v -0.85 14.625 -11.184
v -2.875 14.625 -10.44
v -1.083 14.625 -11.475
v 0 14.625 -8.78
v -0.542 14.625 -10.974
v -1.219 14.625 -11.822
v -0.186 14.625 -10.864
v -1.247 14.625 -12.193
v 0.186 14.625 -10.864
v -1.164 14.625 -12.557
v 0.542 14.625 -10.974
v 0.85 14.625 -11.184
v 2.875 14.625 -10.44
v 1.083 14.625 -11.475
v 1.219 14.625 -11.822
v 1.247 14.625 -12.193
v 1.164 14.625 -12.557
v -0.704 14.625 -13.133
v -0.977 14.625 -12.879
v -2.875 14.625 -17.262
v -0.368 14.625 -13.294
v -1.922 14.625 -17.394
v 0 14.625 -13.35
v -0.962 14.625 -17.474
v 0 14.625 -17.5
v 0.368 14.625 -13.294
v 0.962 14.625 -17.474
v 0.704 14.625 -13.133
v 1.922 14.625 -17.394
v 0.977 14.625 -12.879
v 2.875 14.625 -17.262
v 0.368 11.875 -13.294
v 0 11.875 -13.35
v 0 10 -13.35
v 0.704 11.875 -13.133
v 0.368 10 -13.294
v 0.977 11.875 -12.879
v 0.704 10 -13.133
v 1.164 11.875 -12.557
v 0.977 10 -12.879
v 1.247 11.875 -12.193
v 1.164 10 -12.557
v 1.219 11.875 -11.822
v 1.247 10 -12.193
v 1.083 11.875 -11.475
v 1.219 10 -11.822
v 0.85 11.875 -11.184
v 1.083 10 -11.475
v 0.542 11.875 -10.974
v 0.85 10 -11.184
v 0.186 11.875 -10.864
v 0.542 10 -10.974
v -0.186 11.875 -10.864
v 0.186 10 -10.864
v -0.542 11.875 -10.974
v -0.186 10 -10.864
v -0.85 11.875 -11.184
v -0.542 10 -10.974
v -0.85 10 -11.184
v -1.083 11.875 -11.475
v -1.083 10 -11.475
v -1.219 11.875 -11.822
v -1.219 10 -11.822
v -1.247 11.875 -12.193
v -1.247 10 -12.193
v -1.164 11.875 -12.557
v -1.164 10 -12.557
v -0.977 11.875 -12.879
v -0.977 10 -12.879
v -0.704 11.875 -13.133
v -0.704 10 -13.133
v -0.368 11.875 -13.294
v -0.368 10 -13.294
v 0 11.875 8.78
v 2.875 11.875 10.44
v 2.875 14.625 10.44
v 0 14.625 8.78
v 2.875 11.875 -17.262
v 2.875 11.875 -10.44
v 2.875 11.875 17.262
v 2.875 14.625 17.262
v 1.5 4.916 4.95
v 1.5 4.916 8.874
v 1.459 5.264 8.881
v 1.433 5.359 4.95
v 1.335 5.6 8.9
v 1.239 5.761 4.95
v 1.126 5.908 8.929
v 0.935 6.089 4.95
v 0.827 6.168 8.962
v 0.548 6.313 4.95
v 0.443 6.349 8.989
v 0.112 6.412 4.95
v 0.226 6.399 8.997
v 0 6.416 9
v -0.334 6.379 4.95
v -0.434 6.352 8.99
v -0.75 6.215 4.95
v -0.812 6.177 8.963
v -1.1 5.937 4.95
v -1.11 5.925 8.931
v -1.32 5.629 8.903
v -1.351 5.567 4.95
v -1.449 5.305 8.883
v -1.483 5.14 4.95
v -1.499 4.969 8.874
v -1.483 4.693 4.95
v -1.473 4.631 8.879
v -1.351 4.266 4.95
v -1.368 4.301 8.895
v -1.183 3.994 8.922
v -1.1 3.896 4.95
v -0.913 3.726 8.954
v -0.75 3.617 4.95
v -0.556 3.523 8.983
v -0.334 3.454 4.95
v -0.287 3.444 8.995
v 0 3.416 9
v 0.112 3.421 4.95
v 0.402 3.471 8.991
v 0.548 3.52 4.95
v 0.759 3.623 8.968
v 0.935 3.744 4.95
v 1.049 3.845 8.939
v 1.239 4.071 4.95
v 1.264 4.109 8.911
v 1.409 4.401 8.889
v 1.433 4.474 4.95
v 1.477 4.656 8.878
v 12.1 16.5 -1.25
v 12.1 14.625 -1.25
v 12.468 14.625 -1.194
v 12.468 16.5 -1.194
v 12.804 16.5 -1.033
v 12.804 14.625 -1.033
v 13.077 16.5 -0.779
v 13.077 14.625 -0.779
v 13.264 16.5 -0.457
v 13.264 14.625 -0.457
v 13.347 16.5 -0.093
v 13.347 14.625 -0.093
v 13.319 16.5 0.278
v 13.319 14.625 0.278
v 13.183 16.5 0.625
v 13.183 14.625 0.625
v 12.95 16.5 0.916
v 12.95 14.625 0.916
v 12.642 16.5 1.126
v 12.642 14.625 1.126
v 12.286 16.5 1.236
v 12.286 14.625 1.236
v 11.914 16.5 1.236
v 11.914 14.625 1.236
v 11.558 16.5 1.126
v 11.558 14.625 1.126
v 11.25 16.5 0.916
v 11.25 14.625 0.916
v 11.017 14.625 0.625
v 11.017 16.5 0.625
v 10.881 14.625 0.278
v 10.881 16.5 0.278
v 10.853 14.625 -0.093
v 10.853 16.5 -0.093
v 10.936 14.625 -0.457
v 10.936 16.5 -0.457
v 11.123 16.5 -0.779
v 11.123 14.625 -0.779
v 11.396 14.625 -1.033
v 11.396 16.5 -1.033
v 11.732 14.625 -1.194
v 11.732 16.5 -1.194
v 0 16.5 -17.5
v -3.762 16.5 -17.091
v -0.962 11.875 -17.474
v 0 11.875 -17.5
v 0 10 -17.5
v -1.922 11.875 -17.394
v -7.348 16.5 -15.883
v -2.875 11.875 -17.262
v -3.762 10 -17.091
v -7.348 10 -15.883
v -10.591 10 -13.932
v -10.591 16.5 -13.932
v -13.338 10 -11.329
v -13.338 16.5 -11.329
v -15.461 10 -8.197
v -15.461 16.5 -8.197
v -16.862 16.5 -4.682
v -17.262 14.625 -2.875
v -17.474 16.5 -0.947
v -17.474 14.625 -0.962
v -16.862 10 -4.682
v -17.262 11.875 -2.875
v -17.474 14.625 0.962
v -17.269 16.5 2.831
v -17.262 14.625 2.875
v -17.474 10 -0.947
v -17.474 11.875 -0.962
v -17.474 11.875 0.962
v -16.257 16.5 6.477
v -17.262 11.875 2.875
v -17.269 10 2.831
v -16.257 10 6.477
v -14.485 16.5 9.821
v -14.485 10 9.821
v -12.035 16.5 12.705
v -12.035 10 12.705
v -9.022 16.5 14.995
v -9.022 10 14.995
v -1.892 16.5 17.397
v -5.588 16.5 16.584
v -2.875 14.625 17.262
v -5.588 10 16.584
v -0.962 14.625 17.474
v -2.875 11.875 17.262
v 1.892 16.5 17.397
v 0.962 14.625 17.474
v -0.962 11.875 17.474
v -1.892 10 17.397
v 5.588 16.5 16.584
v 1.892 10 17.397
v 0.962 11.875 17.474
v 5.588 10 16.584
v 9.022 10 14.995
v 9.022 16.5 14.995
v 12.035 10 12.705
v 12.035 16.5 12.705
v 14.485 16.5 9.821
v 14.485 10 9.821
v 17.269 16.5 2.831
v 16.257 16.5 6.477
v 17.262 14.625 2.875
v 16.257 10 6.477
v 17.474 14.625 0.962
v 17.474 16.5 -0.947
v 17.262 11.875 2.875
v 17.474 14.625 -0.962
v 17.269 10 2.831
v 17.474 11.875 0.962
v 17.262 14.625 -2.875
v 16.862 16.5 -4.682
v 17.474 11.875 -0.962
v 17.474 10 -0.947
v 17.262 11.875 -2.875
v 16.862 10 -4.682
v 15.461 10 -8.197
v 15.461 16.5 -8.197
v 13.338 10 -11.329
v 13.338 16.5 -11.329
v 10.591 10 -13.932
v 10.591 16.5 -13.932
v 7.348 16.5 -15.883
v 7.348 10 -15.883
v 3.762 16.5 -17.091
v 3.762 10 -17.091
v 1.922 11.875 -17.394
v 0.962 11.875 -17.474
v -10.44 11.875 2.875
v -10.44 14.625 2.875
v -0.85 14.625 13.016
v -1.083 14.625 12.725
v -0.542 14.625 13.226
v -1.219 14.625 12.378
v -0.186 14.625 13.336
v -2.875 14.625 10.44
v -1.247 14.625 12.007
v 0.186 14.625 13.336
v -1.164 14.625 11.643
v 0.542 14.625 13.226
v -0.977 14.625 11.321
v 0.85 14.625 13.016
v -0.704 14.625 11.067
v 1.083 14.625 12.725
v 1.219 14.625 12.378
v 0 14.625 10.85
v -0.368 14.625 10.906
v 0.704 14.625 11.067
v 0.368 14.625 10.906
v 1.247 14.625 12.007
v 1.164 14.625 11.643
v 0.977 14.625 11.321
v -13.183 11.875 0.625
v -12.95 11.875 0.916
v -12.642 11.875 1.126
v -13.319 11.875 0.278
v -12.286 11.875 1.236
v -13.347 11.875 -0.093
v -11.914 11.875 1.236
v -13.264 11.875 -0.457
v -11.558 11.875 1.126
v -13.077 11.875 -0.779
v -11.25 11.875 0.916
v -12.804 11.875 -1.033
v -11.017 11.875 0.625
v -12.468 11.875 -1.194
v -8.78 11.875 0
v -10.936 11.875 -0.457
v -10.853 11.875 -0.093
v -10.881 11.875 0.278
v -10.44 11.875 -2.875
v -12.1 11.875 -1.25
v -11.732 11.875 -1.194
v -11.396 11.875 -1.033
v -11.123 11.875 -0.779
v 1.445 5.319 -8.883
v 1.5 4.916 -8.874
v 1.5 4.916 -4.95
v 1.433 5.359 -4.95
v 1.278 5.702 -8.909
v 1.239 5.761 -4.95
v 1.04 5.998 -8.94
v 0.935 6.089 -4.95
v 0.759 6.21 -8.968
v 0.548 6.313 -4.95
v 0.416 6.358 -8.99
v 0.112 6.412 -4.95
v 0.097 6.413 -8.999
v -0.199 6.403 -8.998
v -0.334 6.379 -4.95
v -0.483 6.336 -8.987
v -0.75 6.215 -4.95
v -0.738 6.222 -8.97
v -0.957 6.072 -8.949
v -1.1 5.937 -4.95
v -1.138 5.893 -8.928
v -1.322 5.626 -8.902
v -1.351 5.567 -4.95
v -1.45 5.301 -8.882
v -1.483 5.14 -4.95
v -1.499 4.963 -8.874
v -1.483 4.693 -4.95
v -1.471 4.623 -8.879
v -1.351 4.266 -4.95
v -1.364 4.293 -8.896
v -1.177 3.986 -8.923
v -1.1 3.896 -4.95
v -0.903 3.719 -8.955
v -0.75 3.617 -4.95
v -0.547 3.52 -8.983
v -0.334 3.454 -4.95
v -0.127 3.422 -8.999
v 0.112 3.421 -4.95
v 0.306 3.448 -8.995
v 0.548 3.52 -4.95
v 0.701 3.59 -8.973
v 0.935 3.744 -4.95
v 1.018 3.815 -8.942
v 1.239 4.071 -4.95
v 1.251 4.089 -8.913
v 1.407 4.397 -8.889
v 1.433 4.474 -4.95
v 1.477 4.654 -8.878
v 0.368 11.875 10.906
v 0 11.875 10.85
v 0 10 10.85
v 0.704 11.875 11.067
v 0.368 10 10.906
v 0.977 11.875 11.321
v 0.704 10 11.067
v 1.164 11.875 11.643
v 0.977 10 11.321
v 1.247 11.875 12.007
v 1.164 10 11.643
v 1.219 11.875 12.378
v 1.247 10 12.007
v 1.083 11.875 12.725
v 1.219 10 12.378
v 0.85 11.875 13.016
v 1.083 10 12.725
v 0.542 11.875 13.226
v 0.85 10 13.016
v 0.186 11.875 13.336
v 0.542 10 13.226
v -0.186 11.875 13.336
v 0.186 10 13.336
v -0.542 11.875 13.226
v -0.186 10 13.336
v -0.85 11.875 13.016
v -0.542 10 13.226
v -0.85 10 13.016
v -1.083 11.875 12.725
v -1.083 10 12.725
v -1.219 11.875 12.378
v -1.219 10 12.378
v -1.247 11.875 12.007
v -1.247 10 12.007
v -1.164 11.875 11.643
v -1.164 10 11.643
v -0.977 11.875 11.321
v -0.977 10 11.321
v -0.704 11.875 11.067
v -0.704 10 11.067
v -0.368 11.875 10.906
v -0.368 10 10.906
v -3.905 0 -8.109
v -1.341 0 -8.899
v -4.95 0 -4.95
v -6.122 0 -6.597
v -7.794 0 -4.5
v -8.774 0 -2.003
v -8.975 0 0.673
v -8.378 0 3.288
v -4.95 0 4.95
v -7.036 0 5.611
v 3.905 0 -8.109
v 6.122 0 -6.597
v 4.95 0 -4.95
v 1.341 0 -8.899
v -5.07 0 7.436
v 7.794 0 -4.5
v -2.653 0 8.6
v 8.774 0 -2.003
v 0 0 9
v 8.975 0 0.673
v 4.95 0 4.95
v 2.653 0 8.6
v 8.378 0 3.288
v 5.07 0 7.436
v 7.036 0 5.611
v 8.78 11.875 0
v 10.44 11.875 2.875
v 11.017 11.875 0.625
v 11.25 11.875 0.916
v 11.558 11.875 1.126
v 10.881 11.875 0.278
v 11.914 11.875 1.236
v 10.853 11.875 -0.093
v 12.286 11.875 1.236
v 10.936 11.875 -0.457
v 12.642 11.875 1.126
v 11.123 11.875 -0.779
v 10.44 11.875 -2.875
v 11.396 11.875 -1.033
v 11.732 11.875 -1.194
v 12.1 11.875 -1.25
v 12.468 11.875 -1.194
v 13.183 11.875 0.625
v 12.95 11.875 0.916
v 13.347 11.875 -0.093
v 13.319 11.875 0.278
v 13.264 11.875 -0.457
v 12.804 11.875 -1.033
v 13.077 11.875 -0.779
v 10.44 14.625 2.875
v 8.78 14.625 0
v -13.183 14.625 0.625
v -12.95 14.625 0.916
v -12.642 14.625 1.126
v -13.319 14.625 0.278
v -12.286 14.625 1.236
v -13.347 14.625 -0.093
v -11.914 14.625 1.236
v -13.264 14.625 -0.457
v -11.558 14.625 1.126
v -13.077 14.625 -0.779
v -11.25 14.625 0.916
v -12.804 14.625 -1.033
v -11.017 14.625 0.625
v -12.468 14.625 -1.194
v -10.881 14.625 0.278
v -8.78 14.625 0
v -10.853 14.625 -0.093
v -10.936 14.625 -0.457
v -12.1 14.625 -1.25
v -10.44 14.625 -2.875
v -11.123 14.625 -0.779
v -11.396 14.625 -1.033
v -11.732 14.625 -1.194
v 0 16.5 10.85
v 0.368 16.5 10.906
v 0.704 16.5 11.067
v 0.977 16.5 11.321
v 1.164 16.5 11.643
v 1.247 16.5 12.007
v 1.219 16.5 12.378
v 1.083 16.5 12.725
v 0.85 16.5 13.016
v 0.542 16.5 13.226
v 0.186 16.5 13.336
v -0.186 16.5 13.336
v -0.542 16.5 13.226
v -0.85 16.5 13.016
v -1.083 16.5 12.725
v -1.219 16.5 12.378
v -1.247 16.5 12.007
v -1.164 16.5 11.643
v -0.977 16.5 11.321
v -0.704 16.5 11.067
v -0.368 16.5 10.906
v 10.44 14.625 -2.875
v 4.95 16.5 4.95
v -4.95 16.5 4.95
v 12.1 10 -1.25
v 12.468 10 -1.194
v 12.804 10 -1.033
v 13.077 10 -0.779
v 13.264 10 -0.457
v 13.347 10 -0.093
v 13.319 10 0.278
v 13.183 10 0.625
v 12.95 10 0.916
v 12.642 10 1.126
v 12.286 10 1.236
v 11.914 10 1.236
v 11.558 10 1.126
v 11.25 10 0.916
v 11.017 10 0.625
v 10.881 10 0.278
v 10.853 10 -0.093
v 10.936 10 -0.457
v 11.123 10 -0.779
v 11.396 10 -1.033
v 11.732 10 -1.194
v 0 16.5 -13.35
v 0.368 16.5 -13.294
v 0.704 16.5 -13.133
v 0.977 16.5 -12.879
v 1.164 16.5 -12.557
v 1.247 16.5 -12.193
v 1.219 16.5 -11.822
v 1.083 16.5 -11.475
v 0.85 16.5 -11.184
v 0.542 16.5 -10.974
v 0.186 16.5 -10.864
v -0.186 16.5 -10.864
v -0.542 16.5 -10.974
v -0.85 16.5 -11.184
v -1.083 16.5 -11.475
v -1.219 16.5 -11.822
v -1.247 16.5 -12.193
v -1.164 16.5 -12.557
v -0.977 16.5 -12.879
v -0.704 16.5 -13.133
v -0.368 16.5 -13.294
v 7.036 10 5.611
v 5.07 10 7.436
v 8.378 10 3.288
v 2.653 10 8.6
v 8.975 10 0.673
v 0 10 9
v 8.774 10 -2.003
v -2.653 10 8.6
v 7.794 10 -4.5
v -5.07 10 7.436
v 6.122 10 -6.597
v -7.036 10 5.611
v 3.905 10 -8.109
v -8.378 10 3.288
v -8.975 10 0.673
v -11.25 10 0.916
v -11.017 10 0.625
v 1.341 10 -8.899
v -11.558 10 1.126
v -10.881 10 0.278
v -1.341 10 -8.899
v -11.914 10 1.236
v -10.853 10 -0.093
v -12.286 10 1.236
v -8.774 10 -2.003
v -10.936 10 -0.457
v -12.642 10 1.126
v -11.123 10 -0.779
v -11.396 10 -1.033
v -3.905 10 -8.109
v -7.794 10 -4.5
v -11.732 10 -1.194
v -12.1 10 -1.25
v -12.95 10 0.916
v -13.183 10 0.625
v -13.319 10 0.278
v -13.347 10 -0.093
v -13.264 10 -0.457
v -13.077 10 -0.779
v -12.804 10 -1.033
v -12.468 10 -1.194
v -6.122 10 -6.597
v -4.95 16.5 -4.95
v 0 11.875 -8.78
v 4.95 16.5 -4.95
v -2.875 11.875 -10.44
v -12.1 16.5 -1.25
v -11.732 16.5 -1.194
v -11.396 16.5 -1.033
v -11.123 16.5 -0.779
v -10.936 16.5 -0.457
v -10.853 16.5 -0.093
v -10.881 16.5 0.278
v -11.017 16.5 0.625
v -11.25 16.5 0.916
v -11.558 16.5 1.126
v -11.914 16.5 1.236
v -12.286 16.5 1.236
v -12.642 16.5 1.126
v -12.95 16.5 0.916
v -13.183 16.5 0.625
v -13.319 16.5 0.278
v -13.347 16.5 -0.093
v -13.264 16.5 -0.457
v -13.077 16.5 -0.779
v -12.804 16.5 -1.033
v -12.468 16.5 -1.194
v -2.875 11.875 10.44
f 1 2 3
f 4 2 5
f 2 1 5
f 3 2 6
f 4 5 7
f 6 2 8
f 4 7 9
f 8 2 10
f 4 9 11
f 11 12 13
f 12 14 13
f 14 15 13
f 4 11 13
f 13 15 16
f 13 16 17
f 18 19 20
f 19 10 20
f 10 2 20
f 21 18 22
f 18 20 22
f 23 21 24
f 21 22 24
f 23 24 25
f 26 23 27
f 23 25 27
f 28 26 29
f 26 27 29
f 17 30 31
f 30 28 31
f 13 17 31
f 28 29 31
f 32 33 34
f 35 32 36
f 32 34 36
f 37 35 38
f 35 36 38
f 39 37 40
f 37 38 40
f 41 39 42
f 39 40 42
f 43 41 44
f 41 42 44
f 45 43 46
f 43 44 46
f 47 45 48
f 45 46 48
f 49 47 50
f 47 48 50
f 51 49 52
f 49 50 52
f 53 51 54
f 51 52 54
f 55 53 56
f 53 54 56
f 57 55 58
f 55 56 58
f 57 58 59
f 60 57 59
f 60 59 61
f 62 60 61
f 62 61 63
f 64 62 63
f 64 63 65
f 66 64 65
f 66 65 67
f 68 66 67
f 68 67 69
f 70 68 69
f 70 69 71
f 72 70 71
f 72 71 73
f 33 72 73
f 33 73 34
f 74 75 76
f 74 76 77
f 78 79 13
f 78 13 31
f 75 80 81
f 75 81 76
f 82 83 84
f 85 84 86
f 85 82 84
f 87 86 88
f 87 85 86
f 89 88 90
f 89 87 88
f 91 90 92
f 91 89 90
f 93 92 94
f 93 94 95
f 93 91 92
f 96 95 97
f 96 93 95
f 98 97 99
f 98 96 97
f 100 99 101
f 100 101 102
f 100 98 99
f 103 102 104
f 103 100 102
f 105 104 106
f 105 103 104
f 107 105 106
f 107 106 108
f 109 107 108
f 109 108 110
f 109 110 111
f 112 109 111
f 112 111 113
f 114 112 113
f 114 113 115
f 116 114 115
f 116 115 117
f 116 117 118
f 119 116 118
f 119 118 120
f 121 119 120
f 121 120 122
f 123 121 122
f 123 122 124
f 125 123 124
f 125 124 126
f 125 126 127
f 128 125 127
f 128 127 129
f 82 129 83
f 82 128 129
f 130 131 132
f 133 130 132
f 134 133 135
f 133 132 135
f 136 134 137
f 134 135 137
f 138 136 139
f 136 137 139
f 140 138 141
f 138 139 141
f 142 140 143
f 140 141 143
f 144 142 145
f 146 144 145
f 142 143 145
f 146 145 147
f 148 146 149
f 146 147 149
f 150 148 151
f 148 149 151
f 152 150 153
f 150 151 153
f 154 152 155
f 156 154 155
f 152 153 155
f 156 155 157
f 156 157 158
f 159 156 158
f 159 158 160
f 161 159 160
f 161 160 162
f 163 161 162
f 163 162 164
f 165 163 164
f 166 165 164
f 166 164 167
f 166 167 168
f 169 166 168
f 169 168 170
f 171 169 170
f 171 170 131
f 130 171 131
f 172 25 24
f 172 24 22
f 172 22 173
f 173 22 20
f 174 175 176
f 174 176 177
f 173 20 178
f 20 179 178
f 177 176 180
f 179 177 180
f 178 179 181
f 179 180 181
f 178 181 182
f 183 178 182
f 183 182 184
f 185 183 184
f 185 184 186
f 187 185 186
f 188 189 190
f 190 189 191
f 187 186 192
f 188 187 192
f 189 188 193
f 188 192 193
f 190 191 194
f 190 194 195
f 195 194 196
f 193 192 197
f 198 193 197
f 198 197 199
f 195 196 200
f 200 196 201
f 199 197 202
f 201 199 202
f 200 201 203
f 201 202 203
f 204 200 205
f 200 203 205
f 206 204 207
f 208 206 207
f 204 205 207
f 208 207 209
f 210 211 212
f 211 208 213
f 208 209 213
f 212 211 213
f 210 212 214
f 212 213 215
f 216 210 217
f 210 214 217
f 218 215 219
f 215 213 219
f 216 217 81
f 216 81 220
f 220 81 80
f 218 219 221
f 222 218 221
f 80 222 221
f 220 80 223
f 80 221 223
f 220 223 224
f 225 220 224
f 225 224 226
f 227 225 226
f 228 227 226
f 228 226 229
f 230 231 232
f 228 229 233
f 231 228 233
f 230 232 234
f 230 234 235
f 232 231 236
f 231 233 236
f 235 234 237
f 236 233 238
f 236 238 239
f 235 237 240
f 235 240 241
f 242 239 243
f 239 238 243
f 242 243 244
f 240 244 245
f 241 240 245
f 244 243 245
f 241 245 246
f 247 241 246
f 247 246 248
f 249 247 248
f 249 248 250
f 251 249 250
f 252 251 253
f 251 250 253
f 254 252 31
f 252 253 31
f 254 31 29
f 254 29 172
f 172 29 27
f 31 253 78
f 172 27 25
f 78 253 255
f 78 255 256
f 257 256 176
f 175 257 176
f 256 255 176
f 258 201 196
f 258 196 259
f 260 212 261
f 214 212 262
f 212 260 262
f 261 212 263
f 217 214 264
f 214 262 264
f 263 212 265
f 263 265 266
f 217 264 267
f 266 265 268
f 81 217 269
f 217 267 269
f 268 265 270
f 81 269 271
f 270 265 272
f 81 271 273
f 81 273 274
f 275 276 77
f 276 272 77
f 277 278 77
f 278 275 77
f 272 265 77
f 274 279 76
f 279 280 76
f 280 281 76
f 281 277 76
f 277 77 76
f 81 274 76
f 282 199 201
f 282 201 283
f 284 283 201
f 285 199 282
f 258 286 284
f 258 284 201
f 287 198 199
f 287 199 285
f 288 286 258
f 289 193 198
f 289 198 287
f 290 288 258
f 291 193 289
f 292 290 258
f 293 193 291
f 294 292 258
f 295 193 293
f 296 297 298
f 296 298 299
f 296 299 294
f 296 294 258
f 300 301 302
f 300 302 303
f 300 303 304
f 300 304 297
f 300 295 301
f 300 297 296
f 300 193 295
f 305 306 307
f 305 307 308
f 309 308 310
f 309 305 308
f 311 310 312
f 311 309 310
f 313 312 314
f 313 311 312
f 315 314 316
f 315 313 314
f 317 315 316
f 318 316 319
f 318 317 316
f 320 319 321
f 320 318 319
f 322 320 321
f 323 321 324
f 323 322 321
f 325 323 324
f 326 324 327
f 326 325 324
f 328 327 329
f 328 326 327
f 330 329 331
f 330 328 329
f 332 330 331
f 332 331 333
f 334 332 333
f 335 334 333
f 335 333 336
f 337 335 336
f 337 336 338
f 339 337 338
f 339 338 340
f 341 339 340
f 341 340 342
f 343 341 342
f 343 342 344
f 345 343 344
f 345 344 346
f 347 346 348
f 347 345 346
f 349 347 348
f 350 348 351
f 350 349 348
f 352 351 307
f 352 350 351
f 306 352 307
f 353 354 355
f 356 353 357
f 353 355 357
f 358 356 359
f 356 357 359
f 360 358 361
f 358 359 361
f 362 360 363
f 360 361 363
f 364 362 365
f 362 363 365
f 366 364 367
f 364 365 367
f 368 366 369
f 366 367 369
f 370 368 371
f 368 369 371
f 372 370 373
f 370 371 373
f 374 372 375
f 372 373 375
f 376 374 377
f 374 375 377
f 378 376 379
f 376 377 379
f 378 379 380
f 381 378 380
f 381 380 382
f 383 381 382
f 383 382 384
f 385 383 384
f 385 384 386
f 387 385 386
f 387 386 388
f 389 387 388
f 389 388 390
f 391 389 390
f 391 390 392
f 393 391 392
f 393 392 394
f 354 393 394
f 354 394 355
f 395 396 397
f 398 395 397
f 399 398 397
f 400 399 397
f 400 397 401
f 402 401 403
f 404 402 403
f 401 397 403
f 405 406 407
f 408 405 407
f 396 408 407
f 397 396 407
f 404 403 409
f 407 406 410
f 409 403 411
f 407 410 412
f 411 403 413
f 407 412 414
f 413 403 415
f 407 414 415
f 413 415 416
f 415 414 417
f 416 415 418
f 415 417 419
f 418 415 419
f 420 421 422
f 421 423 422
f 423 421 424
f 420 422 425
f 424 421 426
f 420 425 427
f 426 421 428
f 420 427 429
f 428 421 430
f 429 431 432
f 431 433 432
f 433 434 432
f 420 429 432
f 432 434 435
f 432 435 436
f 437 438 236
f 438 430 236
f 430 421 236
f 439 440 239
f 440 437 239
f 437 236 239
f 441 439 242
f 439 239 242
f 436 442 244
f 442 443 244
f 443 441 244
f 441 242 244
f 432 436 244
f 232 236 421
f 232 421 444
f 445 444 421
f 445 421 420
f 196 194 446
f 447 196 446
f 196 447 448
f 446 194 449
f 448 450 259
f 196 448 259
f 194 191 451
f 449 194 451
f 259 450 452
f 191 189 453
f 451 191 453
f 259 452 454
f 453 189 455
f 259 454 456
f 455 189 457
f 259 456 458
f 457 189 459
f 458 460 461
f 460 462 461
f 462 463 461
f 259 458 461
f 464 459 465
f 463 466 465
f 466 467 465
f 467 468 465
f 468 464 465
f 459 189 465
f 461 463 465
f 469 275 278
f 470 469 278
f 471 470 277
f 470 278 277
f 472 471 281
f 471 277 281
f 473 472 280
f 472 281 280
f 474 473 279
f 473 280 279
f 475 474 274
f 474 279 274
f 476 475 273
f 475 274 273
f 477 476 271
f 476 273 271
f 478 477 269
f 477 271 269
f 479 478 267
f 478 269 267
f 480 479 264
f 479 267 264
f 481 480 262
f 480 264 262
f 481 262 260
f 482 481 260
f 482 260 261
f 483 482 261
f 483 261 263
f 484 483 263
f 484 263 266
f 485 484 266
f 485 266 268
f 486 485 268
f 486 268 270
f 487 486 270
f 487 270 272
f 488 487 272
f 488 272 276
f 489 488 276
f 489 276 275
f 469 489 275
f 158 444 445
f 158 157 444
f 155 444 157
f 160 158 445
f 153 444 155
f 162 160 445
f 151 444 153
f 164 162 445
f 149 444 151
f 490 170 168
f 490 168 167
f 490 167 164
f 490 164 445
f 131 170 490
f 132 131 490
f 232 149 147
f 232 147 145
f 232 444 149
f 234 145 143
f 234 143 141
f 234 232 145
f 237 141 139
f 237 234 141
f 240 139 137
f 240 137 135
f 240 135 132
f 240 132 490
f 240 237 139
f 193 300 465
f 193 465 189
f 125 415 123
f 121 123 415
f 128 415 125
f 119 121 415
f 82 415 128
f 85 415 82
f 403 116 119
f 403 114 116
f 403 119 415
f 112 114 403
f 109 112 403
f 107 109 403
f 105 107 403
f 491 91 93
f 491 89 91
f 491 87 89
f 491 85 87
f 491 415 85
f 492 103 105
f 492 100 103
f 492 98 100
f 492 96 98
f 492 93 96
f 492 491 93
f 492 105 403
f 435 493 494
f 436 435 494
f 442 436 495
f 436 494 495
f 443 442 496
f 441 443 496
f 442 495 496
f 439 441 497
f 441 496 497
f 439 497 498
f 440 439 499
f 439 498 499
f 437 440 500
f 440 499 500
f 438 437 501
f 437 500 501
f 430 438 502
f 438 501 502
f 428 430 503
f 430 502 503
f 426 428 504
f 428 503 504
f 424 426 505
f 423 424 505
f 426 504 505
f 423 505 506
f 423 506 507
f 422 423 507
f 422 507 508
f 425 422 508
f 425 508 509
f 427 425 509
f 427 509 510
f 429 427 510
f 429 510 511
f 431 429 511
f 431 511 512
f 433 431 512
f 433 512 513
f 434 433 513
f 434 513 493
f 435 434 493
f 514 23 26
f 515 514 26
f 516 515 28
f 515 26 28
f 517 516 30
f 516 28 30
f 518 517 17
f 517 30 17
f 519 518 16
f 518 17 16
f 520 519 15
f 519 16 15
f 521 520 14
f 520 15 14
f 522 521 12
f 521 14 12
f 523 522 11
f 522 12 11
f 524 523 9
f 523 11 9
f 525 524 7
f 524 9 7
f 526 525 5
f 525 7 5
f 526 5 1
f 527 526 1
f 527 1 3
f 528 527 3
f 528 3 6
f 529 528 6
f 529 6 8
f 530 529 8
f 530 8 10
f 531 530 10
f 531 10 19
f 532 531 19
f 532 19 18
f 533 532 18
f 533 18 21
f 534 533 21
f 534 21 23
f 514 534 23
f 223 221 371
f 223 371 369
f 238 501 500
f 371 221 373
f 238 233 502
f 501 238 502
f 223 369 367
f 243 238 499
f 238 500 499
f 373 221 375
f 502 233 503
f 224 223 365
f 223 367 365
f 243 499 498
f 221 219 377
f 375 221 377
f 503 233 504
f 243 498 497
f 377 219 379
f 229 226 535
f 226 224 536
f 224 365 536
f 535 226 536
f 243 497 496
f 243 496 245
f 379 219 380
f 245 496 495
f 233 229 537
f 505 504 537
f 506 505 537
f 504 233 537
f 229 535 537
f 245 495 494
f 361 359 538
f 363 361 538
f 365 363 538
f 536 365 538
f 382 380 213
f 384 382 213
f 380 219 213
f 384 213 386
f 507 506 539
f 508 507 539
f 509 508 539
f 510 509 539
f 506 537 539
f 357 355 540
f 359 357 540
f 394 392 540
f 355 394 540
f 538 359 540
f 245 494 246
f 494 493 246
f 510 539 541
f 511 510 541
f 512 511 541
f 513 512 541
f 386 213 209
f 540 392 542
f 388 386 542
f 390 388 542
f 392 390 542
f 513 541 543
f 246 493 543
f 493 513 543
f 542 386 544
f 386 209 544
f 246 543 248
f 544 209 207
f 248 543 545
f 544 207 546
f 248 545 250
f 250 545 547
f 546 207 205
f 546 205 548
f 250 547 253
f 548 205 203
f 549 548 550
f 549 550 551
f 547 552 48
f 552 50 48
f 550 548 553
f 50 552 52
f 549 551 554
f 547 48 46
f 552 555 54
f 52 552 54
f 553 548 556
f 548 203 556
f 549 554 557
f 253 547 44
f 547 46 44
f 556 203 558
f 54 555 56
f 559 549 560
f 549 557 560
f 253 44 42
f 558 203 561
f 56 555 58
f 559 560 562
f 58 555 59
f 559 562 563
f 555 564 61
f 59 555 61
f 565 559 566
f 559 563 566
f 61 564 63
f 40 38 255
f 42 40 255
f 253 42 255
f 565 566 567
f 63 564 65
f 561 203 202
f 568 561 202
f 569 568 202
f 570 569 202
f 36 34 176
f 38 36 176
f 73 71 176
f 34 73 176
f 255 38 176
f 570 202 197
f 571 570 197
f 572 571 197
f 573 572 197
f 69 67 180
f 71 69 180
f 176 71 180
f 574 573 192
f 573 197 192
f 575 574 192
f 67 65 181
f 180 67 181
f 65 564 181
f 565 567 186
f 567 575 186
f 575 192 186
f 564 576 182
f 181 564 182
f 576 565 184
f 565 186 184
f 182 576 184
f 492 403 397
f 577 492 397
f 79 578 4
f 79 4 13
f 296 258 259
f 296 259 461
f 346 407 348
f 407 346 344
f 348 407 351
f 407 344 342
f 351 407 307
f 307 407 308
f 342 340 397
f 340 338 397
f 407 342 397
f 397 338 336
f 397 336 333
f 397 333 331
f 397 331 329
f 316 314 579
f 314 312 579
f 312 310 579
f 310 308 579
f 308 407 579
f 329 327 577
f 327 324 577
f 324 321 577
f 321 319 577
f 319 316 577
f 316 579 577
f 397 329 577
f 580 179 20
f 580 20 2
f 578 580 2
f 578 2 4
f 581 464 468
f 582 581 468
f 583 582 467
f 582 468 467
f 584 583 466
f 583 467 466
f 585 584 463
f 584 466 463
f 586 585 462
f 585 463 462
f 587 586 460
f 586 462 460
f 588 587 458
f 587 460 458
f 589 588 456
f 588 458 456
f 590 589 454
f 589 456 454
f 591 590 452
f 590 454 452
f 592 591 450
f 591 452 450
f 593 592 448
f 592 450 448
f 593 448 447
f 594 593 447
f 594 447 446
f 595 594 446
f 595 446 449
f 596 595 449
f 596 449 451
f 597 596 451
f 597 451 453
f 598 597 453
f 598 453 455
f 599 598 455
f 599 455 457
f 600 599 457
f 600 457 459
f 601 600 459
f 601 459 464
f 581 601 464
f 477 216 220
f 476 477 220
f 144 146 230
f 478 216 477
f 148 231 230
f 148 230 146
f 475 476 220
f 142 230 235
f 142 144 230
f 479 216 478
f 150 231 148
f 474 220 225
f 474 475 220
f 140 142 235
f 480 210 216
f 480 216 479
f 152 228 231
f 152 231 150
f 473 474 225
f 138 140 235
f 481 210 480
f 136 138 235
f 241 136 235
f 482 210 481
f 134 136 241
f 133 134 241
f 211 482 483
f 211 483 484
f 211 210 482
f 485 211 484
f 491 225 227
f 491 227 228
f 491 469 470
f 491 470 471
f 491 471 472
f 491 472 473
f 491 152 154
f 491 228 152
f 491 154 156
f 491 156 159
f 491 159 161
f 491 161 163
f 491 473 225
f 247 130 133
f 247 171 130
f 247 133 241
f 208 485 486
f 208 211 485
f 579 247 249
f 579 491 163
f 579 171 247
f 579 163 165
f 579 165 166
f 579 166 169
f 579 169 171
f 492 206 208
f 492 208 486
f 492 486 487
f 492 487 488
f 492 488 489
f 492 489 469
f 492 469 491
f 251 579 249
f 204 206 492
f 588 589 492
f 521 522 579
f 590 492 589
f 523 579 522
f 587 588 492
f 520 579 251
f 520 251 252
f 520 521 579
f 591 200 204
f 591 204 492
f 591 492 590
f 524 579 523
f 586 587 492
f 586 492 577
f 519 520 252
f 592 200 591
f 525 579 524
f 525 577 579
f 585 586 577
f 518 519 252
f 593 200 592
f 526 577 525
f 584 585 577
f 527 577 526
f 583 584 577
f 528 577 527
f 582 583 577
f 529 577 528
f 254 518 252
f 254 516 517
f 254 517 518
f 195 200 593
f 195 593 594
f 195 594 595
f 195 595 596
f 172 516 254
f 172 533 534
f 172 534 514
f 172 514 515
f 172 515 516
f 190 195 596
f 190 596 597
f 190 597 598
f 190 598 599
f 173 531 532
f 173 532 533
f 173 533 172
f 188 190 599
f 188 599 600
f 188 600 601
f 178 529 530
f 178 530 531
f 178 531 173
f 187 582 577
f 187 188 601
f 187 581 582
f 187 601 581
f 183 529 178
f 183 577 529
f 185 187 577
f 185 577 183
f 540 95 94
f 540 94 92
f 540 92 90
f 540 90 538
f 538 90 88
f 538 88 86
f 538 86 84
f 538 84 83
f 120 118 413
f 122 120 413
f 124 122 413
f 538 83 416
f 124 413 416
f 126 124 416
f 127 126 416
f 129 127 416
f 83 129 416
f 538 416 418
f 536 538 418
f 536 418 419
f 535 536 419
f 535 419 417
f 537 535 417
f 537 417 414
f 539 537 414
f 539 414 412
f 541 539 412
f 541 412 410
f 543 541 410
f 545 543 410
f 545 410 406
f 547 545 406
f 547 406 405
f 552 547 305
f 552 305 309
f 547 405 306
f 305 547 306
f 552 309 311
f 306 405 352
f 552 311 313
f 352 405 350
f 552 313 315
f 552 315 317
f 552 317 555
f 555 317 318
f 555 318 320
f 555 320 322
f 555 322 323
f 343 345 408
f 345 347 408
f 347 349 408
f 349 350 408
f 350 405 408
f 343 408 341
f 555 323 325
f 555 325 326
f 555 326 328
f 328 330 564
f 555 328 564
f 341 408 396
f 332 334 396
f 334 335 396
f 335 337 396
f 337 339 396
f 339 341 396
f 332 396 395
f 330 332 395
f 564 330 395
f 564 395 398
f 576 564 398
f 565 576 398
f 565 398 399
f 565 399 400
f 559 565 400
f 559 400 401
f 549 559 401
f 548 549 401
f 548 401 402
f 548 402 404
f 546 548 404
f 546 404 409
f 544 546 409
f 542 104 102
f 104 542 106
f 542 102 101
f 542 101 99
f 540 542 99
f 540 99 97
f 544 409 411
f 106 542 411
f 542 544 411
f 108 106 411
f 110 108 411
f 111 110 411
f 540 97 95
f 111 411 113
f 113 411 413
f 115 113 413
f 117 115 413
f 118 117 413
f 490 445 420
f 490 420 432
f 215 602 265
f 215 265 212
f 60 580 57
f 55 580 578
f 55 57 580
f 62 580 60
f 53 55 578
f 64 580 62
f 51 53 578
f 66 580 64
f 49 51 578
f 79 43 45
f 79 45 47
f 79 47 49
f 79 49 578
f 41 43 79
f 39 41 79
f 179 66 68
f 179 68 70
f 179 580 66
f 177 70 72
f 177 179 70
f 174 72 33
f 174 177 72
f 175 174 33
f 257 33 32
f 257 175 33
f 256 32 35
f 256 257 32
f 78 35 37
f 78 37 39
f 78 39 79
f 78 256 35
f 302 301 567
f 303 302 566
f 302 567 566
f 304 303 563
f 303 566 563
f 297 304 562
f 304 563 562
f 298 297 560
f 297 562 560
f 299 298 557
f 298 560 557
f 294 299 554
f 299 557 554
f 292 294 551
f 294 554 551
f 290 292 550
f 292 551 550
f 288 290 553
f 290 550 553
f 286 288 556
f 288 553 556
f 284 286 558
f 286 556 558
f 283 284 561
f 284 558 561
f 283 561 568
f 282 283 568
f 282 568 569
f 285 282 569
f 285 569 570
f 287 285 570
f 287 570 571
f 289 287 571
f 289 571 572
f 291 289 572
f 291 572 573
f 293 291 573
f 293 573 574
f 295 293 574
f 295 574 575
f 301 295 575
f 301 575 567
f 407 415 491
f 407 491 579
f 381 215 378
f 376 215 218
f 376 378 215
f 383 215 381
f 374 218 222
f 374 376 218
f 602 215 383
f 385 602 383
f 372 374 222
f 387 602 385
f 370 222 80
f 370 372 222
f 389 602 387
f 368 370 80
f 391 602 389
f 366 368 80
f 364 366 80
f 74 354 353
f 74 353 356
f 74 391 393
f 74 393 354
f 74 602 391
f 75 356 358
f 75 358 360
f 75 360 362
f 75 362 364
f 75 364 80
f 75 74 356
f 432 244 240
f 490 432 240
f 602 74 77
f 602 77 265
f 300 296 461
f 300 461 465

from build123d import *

# Parameters (mm, degrees)
SKETCH1_R               = 9
SKETCH1_W               = 9.9
SKETCH1_H               = 9.9
BOSS_EXTRUDE1_DEPTH     = 10
SKETCH2_R               = 17.5
BOSS_EXTRUDE2_DEPTH     = 6.5
CUT_EXTRUDE1_REACH      = 28.693
SKETCH3_R               = 1.25
CUT_EXTRUDE2_DEPTH      = 30.744747435
CUT_EXTRUDE2_DEPTH_BACK = 30.744747435
SKETCH4_R               = 1.5
CUT_EXTRUDE3_DEPTH      = 10
CUT_EXTRUDE3_DEPTH_BACK = 10
SKETCH6_W               = 9.9
SKETCH6_H               = 9.9
SKETCH8_W               = 5.75
SKETCH8_H               = 2.75
CUT_EXTRUDE4_DEPTH      = 5
CUT_EXTRUDE5_DEPTH      = 2.75
CIRPATTERN1_START       = 11.875
CIRPATTERN1_OUTLINE_R   = 1.25
CIRPATTERN1_DEPTH       = 2.75


# Read off the part's stored shape, not the designer's step: CirPattern1
with BuildPart() as part:
    # Sketch1 → Boss-Extrude1 (new body)
    with BuildSketch(Plane(origin=(0, 0, 0), x_dir=(1, 0, 0), z_dir=(0, 1, 0))):
        with Locations(Location((0, 0, 0), (0, 0, 270))):
            Circle(SKETCH1_R)
        Rectangle(SKETCH1_W, SKETCH1_H, mode=Mode.SUBTRACT)
    extrude(amount=BOSS_EXTRUDE1_DEPTH)

    # Sketch2 → Boss-Extrude2 (add)
    with BuildSketch(Plane(origin=(0, 10, 0), x_dir=(1, 0, 0), z_dir=(0, 1, 0))):
        with Locations(Location((0, 0, 0), (0, 0, 90))):
            Circle(SKETCH2_R)
    extrude(amount=BOSS_EXTRUDE2_DEPTH)

    # Sketch3 → Cut-Extrude1 (cut, up to next)
    with BuildSketch(Plane.XZ.offset(-10), mode=Mode.PRIVATE) as cut_extrude1_sk1:
        with Locations(Location((12.1, 0, 0), (0, 0, 270))):
            Circle(SKETCH3_R)
    cut_extrude1_tool1 = extrude(cut_extrude1_sk1.sketch, amount=-CUT_EXTRUDE1_REACH, mode=Mode.PRIVATE) & part.part
    # Sketch3 → Cut-Extrude1 (cut, up to next)
    with BuildSketch(Plane.XZ.offset(-10), mode=Mode.PRIVATE) as cut_extrude1_sk2:
        with Locations(Location((0, -12.1, 0), (0, 0, 270))):
            Circle(SKETCH3_R)
    cut_extrude1_tool2 = extrude(cut_extrude1_sk2.sketch, amount=-CUT_EXTRUDE1_REACH, mode=Mode.PRIVATE) & part.part
    # Sketch3 → Cut-Extrude1 (cut, up to next)
    with BuildSketch(Plane.XZ.offset(-10), mode=Mode.PRIVATE) as cut_extrude1_sk3:
        with Locations(Location((-12.1, 0, 0), (0, 0, 270))):
            Circle(SKETCH3_R)
    cut_extrude1_tool3 = extrude(cut_extrude1_sk3.sketch, amount=-CUT_EXTRUDE1_REACH, mode=Mode.PRIVATE) & part.part
    # Sketch3 → Cut-Extrude1 (cut, up to next)
    with BuildSketch(Plane.XZ.offset(-10), mode=Mode.PRIVATE) as cut_extrude1_sk4:
        with Locations(Location((0, 12.1, 0), (0, 0, 270))):
            Circle(SKETCH3_R)
    cut_extrude1_tool4 = extrude(cut_extrude1_sk4.sketch, amount=-CUT_EXTRUDE1_REACH, mode=Mode.PRIVATE) & part.part
    add(cut_extrude1_tool1.solids().sort_by_distance((12.1, 10, 0))[0], mode=Mode.SUBTRACT)
    add(cut_extrude1_tool2.solids().sort_by_distance((0, 10, -12.1))[0], mode=Mode.SUBTRACT)
    add(cut_extrude1_tool3.solids().sort_by_distance((-12.1, 10, 0))[0], mode=Mode.SUBTRACT)
    add(cut_extrude1_tool4.solids().sort_by_distance((0, 10, 12.1))[0], mode=Mode.SUBTRACT)

    # Sketch4 → Cut-Extrude2 (cut, two sides: drawn at the far end of the back side and taken through both)
    with BuildSketch(Plane.XY.offset(-CUT_EXTRUDE2_DEPTH_BACK)):
        with Locations((0, 4.916404418)):
            Circle(SKETCH4_R)
    extrude(amount=CUT_EXTRUDE2_DEPTH + CUT_EXTRUDE2_DEPTH_BACK, mode=Mode.SUBTRACT)

    # Sketch6 → Cut-Extrude3 (cut, two sides: drawn at the far end of the back side and taken through both)
    with BuildSketch(Plane(origin=(0, 10, 0), x_dir=(-1, 0, 0), z_dir=(0, -1, 0)).offset(-CUT_EXTRUDE3_DEPTH_BACK)):
        Rectangle(SKETCH6_W, SKETCH6_H)
    extrude(amount=CUT_EXTRUDE3_DEPTH + CUT_EXTRUDE3_DEPTH_BACK, mode=Mode.SUBTRACT)

    # Sketch8 → Cut-Extrude4 (cut)
    with BuildSketch(Plane(origin=(17.5, 0, 0), x_dir=(0, 0, -1), z_dir=(1, 0, 0))):
        with Locations((0, 13.25)):
            Rectangle(SKETCH8_W, SKETCH8_H)
    extrude(amount=-CUT_EXTRUDE4_DEPTH, mode=Mode.SUBTRACT)

    # Sketch9 → Cut-Extrude5 (cut)
    with BuildSketch(Plane.XZ.offset(-14.625)):
        Polygon((15.419764048, 0), (13.759882024, 2.875), (10.440117976, 2.875), (8.780235952, 0), (10.440117976, -2.875), (13.759882024, -2.875), align=None)
    extrude(amount=CUT_EXTRUDE5_DEPTH, mode=Mode.SUBTRACT)

    # CirPattern1 outline → CirPattern1 (cut)
    # profile 1 of 3: a face of its own
    with BuildSketch(Plane(origin=(0, 0, 0), x_dir=(1, 0, 0), z_dir=(0, 1, 0)).offset(CIRPATTERN1_START)):
        with BuildLine():
            Line((-8.780235952, 0), (-10.440117976, 2.875))
            Line((-10.440117976, 2.875), (-17.26222393, 2.875))
            ThreePointArc((-17.26222393, 2.875), (-17.5, 0), (-17.26222393, -2.875))
            Line((-17.26222393, -2.875), (-10.440117976, -2.875))
            Line((-10.440117976, -2.875), (-8.780235952, 0))
        make_face()
        with Locations((-12.1, 0)):
            Circle(CIRPATTERN1_OUTLINE_R, mode=Mode.SUBTRACT)
    # profile 2 of 3: a face of its own
    with BuildSketch(Plane(origin=(0, 0, 0), x_dir=(1, 0, 0), z_dir=(0, 1, 0)).offset(CIRPATTERN1_START)):
        with BuildLine():
            ThreePointArc((2.875, 17.26222393), (0, 17.5), (-2.875, 17.26222393))
            Line((-2.875, 17.26222393), (-2.875, 10.440117976))
            Line((-2.875, 10.440117976), (0, 8.780235952))
            Line((0, 8.780235952), (2.875, 10.440117976))
            Line((2.875, 10.440117976), (2.875, 17.26222393))
        make_face()
        with Locations((0, 12.1)):
            Circle(CIRPATTERN1_OUTLINE_R, mode=Mode.SUBTRACT)
    # profile 3 of 3: a face of its own
    with BuildSketch(Plane(origin=(0, 0, 0), x_dir=(1, 0, 0), z_dir=(0, 1, 0)).offset(CIRPATTERN1_START)):
        with BuildLine():
            Line((-2.875, -10.440117976), (-2.875, -17.26222393))
            ThreePointArc((-2.875, -17.26222393), (0, -17.5), (2.875, -17.26222393))
            Line((2.875, -17.26222393), (2.875, -10.440117976))
            Line((2.875, -10.440117976), (0, -8.780235952))
            Line((0, -8.780235952), (-2.875, -10.440117976))
        make_face()
        with Locations((0, -12.1)):
            Circle(CIRPATTERN1_OUTLINE_R, mode=Mode.SUBTRACT)
    extrude(amount=CIRPATTERN1_DEPTH, mode=Mode.SUBTRACT)


solid = part.part
